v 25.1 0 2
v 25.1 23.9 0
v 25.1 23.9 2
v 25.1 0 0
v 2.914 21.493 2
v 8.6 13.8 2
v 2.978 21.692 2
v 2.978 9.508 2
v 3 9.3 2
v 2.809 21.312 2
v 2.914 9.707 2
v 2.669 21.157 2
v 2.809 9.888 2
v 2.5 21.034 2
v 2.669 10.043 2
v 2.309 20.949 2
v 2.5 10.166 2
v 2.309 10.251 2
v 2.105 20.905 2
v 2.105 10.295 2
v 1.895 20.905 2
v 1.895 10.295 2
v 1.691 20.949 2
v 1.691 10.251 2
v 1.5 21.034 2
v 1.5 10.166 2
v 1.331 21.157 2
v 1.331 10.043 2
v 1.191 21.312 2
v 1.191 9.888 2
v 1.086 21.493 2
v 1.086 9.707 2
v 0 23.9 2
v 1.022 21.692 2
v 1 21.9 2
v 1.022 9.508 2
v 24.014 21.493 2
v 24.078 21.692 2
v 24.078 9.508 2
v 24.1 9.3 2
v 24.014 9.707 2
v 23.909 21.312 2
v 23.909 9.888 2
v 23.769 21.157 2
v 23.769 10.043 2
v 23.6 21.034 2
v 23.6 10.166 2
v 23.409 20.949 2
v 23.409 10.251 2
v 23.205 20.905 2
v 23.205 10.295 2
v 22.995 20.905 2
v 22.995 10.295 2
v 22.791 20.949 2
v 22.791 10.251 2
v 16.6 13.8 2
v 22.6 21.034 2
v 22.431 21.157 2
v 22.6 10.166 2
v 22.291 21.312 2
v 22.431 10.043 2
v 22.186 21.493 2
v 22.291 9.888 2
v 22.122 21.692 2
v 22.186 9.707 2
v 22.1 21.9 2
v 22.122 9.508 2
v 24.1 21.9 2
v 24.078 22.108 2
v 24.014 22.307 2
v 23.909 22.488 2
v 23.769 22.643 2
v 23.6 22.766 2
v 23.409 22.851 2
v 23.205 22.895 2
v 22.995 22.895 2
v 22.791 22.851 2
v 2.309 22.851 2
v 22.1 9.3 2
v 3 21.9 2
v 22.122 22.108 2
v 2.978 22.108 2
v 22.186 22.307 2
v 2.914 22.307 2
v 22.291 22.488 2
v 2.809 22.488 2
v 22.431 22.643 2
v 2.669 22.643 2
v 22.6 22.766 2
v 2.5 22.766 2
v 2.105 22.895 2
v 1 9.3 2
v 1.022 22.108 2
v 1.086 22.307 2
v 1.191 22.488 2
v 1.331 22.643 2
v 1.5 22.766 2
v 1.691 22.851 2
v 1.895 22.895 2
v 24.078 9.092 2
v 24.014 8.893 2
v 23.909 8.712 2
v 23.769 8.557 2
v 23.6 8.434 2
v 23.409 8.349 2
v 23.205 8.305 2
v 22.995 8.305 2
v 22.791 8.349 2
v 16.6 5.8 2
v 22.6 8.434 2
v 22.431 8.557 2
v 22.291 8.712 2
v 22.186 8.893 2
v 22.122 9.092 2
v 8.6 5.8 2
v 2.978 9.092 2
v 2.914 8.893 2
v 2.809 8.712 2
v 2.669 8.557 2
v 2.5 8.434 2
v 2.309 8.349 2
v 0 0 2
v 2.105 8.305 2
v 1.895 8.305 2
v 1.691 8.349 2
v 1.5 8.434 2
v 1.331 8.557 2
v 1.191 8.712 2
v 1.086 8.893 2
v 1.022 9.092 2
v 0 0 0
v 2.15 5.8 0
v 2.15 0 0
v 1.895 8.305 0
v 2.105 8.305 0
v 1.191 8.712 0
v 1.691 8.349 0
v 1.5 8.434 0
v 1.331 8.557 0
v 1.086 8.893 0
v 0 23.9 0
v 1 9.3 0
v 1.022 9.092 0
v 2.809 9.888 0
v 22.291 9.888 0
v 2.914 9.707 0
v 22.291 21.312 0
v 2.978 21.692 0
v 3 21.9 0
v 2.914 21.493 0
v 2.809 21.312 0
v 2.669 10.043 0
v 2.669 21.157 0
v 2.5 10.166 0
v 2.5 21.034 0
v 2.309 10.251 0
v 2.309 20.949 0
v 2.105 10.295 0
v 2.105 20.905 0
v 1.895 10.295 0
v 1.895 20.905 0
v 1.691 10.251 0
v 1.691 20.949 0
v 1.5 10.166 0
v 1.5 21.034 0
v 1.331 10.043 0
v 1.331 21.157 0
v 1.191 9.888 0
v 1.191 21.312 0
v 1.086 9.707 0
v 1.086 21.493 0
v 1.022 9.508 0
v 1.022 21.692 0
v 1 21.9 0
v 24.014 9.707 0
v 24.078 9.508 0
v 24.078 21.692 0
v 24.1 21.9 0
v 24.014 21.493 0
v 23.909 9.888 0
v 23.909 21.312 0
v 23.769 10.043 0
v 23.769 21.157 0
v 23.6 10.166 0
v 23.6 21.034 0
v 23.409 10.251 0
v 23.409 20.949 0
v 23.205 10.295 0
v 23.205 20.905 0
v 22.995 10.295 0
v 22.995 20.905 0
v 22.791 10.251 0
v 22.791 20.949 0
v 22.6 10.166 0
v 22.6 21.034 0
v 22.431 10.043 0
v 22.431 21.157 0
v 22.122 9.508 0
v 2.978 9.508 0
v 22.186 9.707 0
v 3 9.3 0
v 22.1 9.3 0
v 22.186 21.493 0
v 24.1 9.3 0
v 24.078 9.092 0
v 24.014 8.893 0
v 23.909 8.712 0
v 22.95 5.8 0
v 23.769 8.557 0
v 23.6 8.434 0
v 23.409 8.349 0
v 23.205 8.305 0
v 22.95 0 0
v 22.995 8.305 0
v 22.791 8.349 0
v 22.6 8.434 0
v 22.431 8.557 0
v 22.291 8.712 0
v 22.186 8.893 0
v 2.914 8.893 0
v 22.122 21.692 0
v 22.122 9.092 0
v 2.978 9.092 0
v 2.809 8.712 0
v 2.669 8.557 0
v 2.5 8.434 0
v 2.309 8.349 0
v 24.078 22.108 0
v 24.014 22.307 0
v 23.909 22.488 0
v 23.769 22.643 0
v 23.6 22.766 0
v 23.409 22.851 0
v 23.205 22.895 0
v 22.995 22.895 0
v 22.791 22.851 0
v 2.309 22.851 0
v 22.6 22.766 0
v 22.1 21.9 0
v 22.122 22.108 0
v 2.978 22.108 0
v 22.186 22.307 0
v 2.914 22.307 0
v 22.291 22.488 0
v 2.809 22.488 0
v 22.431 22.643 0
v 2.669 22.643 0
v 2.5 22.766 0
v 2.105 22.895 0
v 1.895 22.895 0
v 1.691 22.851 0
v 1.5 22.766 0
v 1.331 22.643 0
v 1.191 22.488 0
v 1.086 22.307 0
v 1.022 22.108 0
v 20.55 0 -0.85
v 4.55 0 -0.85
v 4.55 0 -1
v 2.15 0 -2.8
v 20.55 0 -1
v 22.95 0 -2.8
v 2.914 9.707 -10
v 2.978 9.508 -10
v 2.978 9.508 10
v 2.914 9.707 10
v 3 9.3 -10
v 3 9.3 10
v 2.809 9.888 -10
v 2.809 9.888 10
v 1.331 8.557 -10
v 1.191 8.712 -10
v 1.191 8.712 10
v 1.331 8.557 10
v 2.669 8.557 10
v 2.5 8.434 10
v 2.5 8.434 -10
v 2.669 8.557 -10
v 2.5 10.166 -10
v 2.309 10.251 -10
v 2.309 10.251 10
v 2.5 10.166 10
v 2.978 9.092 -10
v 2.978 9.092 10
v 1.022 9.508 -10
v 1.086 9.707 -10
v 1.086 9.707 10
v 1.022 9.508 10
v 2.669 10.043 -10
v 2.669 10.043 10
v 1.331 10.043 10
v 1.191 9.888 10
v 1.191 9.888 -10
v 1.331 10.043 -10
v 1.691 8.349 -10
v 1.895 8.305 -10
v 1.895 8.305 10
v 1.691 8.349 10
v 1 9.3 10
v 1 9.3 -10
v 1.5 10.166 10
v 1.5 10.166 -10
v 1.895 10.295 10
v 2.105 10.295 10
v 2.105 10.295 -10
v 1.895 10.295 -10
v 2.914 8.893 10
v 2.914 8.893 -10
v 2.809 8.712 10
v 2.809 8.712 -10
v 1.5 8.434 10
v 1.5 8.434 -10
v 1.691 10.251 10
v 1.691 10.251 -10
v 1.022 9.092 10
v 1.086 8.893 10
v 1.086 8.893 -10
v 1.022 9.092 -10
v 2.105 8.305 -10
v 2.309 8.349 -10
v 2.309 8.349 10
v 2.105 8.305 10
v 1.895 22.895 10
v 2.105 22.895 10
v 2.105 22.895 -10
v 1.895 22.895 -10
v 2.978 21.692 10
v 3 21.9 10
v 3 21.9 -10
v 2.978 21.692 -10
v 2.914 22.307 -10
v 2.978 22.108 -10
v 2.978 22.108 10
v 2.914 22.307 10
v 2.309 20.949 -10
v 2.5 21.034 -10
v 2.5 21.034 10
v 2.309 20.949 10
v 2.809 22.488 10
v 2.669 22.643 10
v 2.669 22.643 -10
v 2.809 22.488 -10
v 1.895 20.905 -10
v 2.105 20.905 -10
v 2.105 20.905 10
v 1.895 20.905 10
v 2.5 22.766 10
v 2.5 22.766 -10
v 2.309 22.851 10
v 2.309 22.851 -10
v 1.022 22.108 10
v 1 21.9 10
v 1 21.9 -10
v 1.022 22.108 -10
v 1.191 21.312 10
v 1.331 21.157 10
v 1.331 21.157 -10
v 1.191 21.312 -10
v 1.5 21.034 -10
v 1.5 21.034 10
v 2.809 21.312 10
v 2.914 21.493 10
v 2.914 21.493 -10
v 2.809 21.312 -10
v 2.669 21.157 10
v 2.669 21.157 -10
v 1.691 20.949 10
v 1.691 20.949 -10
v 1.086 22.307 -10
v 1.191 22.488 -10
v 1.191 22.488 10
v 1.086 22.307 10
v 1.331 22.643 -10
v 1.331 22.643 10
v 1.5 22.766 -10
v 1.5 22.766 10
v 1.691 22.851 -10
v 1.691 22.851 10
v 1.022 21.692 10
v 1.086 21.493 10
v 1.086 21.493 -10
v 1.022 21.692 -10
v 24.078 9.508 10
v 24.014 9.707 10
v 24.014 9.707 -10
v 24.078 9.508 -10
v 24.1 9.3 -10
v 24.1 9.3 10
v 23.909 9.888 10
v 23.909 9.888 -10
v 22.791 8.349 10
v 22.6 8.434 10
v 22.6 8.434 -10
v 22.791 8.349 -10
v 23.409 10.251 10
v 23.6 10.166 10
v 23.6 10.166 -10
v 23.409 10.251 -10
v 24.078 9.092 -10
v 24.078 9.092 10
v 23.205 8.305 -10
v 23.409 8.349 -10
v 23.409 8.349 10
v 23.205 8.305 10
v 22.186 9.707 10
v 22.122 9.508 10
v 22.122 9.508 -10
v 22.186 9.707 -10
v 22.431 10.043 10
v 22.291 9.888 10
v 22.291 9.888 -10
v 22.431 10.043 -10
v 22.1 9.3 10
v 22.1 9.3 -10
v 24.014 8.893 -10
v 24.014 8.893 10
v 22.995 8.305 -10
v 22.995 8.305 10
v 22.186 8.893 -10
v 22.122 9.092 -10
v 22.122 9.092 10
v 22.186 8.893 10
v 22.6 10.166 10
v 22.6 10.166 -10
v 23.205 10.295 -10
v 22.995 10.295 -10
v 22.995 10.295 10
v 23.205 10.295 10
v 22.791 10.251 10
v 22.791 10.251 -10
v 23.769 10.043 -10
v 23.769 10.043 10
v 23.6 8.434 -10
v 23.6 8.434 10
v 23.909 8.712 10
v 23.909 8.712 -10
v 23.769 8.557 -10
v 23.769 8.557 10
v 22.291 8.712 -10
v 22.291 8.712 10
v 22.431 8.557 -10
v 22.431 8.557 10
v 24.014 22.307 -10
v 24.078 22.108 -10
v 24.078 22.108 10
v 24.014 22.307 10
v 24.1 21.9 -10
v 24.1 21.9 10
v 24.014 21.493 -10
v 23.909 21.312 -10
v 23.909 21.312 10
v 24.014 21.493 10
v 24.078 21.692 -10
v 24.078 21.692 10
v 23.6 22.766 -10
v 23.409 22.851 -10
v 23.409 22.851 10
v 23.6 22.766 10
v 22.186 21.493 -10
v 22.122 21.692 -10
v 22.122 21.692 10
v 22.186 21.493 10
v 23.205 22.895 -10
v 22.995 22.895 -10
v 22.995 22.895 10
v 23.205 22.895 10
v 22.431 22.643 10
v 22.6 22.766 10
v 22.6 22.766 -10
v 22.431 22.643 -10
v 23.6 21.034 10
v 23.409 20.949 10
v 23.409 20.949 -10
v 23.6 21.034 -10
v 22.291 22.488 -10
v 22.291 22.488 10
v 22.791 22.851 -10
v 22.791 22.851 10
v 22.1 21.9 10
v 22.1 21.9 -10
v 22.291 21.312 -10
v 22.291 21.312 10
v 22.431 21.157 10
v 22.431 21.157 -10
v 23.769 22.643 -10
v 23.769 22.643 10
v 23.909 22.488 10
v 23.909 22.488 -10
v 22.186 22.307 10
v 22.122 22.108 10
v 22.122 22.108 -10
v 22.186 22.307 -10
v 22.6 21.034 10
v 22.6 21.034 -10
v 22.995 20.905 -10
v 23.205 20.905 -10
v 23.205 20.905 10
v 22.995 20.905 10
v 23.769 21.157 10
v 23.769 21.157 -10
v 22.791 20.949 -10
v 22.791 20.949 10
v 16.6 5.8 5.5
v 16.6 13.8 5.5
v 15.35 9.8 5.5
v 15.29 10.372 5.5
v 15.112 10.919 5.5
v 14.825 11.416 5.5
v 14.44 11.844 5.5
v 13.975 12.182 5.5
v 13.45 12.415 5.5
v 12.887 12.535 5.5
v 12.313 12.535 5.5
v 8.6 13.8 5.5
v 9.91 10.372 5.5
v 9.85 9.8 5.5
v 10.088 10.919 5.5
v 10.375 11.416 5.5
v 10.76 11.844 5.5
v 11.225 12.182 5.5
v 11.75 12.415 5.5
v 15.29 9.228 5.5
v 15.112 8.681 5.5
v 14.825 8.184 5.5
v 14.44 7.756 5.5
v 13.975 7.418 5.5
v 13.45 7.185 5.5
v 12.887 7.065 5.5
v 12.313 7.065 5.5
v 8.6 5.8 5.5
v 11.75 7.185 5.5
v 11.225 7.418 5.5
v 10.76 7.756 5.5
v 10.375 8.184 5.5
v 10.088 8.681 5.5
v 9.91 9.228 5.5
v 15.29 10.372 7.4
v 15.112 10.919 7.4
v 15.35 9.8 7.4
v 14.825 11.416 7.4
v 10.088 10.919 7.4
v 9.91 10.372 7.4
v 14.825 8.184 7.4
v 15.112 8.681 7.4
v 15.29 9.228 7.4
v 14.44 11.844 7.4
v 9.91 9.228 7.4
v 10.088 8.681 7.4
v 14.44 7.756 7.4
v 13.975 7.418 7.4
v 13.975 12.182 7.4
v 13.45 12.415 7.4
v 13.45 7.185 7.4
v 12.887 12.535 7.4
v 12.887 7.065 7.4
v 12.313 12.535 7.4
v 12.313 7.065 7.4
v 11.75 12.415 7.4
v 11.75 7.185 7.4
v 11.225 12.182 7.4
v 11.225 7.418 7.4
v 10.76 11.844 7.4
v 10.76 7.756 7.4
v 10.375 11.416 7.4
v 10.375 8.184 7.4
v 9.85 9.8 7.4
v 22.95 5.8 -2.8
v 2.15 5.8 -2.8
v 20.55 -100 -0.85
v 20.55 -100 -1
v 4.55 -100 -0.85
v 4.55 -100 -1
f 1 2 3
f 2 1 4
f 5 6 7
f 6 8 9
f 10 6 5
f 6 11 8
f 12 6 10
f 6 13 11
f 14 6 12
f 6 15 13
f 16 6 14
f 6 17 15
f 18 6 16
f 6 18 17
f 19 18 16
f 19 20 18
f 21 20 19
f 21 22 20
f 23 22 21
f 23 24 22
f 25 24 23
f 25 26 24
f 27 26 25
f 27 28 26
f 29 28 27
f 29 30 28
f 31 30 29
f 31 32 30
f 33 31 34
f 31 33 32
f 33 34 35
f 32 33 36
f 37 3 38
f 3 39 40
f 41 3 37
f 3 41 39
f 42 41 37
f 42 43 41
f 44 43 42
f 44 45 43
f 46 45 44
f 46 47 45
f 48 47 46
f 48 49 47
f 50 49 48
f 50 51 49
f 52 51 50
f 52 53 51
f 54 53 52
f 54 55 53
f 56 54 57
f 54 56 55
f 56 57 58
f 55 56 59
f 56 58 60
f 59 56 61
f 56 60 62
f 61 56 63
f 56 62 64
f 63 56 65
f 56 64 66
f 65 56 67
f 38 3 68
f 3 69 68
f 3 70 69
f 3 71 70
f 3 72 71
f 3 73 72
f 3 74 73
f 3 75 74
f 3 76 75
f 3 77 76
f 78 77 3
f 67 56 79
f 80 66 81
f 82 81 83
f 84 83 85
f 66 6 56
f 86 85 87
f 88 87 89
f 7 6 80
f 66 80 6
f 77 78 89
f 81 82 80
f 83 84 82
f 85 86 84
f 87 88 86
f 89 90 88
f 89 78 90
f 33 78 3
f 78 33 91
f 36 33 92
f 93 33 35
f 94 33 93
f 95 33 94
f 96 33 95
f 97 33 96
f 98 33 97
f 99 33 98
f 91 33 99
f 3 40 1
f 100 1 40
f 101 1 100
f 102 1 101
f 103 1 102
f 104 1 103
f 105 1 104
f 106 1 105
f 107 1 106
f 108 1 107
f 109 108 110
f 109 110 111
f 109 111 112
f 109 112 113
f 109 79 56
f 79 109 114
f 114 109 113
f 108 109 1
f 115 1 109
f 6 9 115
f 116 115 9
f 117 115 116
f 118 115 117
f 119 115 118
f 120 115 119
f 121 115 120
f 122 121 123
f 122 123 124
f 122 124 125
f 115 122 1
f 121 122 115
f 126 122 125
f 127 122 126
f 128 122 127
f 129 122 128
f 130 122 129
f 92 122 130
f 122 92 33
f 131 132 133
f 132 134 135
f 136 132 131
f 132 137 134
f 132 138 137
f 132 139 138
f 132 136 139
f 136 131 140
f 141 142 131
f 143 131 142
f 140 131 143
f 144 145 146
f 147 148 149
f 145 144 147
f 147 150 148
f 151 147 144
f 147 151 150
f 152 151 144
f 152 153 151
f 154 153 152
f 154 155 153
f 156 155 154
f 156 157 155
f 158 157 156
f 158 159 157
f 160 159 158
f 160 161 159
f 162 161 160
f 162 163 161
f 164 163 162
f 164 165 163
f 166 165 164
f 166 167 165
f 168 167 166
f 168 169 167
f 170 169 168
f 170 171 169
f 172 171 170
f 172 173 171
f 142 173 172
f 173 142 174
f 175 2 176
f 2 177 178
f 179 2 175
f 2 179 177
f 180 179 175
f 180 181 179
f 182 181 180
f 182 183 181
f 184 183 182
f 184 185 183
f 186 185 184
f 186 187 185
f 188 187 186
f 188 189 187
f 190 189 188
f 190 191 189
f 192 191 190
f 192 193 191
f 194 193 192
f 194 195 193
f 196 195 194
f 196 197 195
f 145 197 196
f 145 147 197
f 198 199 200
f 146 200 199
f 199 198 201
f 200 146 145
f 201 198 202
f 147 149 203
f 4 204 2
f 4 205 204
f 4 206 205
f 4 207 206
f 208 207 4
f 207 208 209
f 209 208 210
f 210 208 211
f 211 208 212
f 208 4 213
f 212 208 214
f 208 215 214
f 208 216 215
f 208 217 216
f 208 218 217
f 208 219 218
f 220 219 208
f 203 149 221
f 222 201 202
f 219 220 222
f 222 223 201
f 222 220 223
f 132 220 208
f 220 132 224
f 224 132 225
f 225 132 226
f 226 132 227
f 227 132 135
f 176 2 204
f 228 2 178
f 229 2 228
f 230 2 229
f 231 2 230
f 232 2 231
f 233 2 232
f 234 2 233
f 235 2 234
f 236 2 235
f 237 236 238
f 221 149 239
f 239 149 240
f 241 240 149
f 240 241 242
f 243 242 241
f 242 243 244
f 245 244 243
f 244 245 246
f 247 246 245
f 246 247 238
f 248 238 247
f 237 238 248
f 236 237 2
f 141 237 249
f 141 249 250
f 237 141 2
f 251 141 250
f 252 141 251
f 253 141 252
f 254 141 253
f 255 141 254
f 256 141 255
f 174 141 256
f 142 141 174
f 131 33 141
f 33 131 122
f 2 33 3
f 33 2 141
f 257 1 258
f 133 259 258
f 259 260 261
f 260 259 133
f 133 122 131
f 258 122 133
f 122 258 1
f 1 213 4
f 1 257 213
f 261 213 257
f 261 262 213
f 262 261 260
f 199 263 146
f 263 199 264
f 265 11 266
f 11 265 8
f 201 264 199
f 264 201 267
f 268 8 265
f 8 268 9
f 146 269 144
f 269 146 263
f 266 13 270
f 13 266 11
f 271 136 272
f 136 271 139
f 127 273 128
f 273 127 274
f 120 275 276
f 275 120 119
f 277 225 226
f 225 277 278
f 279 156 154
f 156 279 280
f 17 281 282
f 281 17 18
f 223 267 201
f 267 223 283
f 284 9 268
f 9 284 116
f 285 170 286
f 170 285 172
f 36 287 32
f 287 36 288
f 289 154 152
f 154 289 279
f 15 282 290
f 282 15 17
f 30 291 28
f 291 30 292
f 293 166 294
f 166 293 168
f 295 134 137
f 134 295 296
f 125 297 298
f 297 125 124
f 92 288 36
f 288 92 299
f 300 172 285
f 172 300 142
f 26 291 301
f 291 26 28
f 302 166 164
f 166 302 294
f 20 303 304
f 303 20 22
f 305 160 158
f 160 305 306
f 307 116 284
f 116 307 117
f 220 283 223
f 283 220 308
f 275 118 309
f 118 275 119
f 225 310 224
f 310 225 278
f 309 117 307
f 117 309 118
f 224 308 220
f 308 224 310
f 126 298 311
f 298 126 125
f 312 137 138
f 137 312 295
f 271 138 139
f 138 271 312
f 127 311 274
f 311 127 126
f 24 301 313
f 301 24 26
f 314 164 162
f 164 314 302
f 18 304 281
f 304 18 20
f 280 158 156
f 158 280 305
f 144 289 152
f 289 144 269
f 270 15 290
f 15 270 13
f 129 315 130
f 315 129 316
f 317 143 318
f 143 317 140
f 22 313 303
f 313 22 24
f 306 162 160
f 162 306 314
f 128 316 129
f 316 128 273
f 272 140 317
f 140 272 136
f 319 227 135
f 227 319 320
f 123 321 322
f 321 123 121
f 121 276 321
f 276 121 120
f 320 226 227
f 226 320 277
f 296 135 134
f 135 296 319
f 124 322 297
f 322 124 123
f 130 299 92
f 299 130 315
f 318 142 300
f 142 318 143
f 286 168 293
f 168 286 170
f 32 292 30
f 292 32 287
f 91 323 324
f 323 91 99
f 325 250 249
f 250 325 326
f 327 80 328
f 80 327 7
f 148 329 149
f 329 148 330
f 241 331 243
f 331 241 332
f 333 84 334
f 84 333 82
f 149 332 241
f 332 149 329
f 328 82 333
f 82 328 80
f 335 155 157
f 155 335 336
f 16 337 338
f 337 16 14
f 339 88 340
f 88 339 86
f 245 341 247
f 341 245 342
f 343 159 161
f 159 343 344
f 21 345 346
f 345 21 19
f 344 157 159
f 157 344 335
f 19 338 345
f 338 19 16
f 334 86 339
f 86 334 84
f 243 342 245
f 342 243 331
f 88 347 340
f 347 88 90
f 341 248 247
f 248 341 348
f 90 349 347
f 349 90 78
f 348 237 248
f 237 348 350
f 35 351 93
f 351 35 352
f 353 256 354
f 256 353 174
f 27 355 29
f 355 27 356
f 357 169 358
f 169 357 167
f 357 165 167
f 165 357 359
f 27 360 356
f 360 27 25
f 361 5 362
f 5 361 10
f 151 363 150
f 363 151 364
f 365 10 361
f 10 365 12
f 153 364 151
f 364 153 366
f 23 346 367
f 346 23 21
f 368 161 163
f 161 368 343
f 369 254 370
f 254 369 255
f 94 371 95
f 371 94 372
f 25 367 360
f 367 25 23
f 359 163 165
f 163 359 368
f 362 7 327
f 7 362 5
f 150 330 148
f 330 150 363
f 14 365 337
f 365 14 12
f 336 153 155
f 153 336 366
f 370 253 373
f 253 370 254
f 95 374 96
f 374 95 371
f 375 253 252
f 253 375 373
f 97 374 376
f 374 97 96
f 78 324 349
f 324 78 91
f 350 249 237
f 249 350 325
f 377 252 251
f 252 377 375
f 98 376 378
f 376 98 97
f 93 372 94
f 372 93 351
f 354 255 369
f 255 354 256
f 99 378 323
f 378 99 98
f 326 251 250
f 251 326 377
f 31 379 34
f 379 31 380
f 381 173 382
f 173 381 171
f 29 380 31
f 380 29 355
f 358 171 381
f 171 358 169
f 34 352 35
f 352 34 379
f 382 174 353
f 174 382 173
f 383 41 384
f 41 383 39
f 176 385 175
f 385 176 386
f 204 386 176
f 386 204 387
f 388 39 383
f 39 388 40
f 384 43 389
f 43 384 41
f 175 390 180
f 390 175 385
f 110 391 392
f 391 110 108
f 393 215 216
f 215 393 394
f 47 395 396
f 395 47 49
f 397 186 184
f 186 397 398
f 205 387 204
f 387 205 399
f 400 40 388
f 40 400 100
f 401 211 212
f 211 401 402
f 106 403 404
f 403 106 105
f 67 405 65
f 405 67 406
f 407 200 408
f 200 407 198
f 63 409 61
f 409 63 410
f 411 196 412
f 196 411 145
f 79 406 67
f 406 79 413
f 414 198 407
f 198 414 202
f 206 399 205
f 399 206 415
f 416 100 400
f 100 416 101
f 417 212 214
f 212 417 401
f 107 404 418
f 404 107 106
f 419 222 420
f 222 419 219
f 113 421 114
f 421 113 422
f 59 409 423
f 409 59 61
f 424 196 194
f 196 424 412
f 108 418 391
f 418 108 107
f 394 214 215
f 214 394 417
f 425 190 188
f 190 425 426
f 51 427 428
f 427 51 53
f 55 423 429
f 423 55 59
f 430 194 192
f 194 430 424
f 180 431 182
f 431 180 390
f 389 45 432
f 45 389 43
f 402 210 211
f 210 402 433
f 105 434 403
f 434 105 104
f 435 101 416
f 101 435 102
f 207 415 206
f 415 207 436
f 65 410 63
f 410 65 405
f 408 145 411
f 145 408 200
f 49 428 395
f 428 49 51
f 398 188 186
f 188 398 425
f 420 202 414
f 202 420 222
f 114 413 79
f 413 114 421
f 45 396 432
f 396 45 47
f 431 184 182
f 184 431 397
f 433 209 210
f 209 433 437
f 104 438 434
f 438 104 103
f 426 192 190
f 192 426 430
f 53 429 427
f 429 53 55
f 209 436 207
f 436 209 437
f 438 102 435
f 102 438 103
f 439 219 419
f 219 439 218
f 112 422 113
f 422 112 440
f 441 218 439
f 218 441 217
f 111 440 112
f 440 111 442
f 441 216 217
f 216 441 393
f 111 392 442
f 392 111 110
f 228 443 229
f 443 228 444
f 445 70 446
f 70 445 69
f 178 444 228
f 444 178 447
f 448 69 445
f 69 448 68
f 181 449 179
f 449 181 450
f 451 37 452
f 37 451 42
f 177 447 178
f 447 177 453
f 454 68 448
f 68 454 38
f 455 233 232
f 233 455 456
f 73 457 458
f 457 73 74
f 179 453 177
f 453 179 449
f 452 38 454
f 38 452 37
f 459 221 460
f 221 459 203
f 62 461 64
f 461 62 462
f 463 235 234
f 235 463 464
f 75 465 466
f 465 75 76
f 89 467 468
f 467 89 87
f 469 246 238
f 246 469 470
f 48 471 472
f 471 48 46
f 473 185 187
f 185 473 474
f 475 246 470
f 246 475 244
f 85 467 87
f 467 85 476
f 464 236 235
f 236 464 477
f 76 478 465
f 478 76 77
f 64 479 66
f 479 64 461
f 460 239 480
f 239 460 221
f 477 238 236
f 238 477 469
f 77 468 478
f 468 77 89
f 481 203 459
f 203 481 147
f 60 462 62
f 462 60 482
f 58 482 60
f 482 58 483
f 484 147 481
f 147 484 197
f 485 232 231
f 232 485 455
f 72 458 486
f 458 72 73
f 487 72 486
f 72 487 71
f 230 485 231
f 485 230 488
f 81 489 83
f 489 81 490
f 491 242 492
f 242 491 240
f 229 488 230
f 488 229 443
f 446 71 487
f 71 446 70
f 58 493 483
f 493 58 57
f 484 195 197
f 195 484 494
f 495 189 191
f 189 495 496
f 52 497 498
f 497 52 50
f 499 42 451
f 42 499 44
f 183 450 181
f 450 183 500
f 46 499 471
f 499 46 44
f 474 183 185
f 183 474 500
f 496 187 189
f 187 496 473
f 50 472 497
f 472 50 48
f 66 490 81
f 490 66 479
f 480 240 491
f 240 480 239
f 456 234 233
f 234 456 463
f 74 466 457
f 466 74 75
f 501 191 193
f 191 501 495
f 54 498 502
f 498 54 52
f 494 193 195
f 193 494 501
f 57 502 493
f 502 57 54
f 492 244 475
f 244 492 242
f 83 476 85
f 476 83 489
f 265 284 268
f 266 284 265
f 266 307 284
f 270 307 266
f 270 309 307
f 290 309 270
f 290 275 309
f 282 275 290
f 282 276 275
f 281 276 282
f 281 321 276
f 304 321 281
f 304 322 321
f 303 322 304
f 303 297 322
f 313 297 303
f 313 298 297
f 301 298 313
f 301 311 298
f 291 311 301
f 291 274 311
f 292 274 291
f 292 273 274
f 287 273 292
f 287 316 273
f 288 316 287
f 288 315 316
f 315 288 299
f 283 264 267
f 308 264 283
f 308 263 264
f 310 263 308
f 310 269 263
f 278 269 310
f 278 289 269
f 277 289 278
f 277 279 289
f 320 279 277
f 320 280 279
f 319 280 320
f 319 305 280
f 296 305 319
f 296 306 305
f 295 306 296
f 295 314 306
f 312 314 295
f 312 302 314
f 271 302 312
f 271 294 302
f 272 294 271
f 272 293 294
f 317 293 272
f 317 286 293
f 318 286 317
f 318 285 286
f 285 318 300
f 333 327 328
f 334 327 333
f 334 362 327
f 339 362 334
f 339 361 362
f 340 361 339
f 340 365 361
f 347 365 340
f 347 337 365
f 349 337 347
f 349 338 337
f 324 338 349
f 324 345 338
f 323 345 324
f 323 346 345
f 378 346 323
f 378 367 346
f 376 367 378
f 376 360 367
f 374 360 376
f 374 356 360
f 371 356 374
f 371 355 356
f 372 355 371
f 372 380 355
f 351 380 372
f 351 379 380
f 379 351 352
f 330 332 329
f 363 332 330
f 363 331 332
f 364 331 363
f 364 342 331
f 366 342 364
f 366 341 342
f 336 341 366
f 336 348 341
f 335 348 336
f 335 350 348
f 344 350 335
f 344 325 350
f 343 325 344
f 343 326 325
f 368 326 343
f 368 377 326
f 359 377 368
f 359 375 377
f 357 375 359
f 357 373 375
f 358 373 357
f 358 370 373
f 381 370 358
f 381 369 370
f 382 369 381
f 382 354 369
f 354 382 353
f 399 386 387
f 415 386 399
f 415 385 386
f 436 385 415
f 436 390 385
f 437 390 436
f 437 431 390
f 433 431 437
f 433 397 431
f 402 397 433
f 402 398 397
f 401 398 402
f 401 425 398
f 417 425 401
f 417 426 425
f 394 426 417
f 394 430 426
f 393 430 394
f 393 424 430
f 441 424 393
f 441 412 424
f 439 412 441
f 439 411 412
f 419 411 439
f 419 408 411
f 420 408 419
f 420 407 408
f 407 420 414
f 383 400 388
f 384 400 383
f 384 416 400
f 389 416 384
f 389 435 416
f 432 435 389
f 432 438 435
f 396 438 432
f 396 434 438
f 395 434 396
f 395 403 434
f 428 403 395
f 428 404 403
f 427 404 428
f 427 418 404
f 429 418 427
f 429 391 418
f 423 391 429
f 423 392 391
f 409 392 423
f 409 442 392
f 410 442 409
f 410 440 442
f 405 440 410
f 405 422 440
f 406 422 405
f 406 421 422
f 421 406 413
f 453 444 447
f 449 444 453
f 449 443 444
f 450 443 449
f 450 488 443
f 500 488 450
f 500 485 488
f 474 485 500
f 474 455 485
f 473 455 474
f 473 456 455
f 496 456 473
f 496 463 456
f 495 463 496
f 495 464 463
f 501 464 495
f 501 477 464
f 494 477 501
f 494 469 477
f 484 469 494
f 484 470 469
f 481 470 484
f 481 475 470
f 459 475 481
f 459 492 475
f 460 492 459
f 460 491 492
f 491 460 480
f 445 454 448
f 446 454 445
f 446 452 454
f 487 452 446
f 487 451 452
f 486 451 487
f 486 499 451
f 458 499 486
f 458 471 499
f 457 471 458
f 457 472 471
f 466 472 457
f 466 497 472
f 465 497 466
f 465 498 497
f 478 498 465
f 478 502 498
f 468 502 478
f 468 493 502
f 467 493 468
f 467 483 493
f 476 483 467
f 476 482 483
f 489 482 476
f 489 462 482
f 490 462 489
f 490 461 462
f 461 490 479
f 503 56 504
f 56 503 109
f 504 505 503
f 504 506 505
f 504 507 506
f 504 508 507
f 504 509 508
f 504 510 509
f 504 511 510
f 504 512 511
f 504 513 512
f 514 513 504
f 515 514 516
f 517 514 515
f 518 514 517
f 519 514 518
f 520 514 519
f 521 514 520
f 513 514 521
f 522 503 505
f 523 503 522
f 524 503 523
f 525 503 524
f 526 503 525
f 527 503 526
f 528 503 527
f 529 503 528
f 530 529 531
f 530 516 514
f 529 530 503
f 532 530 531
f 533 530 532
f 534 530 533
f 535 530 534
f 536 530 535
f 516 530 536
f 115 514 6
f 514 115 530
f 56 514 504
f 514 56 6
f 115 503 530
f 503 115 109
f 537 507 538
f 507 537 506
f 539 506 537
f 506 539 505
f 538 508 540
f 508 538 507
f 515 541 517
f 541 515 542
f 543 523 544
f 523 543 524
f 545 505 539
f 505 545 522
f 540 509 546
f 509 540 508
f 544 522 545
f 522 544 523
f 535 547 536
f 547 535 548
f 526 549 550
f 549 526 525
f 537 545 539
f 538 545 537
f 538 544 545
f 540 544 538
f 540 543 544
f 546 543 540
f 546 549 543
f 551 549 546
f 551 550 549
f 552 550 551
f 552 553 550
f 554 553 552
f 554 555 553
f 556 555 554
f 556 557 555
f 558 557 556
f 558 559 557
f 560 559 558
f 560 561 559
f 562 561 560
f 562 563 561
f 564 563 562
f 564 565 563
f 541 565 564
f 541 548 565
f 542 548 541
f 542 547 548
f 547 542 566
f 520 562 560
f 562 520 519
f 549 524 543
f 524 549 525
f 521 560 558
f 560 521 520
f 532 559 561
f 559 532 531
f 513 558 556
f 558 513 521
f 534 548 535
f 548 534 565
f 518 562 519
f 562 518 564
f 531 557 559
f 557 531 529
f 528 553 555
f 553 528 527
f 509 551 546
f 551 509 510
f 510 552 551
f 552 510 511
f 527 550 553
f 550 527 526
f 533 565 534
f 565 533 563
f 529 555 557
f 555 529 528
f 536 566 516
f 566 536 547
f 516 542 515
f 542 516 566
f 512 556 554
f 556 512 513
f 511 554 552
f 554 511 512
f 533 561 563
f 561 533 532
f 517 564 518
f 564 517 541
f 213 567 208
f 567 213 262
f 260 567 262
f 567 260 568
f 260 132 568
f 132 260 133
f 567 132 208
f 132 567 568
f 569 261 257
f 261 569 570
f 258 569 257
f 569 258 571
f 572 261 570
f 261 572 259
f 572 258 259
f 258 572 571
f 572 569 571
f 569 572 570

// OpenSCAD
j=1;
$fn=30;

hinge_bolt=3; // Bolt diameter
hinge_slack=0.2;

module PiCam(ribbon=true, extend_holes=true)
{
	// PCB
	color([0.2,0.5,0])
	difference()
	{
		cube([25.1, 23.9, 2]);
		translate([2, 9.3, -j])cylinder(r=1, h=3+j+j);
		translate([2, 21.9, -j])cylinder(r=1, h=3+j+j);
		translate([23.1, 9.3, -j])cylinder(r=1, h=3+j+j);
		translate([23.1, 21.9, -j])cylinder(r=1, h=3+j+j);
	}
	if(extend_holes)
	{
		translate([2, 9.3, -10])cylinder(r=1, h=20);
		translate([2, 21.9, -10])cylinder(r=1, h=20);
		translate([23.1, 9.3, -10])cylinder(r=1, h=20);
		translate([23.1, 21.9, -10])cylinder(r=1, h=20);
	}
	
	// Camera
	color([0.3, 0.3, 0.3]) translate([8.6, 5.8, 2]) cube([8, 8, 3.5]);
	color([0.2, 0.2, 0.2]) translate([12.6, 9.8, 2]) cylinder(r=5.5/2, h=5.4);

	// Ribbon connector
	color([0.5, 0.5, 0]) translate([(25.1-20.8)/2, 0, -2.8]) cube([20.8, 5.8, 2.8]);
	
	// Ribbon
	if(ribbon)
	{
		translate([(25.1-16)/2, -100, -1]) cube([16, 100, 0.15]);
	}
	
}



!PiCam();

module Claw()
{
	translate([hinge_bolt*1.5, 0, 0])
	difference()
	{
		union()
		{
			cylinder(r=hinge_bolt, h=hinge_bolt-hinge_slack, center=true);
			translate([-hinge_bolt*0.75, 0, 0]) cube([hinge_bolt*1.5, hinge_bolt*2, hinge_bolt-hinge_slack], center=true);
		}
		cylinder(r=hinge_bolt/2, h=hinge_bolt-hinge_slack+j+j, center=true);
	}
}

module ClawFemale()
{
	color([0.3, 0.5, 0])
	{
		translate([-6, 0, 0]) rotate([0, 270, 0]) Claw();
		rotate([0, 270, 0]) Claw();
		translate([6, 0, 0]) rotate([0, 270, 0]) Claw();
	}
}

module ClawMale()
{
	color([0.4, 0.7, 0])
	{
		translate([-3, 0, 0]) rotate([0, 270, 0]) Claw();
		translate([3, 0, 0]) rotate([0, 270, 0]) Claw();
	}
}

module Stand()
{
	translate([-10, -hinge_bolt, 0]) cube([20, hinge_bolt*2, 100]);
	translate([0, 0, 100]) ClawFemale();
}

module Top()
{
	translate([-15, 0, -hinge_bolt]) cube([30, 30, 10]);
	rotate([90, 0, 0]) ClawMale();
}

translate([0, -100-hinge_bolt*1.5, 0])
rotate([-90, 0, 0]) Stand();

translate([0, hinge_bolt*1.5, 0])
Top();
